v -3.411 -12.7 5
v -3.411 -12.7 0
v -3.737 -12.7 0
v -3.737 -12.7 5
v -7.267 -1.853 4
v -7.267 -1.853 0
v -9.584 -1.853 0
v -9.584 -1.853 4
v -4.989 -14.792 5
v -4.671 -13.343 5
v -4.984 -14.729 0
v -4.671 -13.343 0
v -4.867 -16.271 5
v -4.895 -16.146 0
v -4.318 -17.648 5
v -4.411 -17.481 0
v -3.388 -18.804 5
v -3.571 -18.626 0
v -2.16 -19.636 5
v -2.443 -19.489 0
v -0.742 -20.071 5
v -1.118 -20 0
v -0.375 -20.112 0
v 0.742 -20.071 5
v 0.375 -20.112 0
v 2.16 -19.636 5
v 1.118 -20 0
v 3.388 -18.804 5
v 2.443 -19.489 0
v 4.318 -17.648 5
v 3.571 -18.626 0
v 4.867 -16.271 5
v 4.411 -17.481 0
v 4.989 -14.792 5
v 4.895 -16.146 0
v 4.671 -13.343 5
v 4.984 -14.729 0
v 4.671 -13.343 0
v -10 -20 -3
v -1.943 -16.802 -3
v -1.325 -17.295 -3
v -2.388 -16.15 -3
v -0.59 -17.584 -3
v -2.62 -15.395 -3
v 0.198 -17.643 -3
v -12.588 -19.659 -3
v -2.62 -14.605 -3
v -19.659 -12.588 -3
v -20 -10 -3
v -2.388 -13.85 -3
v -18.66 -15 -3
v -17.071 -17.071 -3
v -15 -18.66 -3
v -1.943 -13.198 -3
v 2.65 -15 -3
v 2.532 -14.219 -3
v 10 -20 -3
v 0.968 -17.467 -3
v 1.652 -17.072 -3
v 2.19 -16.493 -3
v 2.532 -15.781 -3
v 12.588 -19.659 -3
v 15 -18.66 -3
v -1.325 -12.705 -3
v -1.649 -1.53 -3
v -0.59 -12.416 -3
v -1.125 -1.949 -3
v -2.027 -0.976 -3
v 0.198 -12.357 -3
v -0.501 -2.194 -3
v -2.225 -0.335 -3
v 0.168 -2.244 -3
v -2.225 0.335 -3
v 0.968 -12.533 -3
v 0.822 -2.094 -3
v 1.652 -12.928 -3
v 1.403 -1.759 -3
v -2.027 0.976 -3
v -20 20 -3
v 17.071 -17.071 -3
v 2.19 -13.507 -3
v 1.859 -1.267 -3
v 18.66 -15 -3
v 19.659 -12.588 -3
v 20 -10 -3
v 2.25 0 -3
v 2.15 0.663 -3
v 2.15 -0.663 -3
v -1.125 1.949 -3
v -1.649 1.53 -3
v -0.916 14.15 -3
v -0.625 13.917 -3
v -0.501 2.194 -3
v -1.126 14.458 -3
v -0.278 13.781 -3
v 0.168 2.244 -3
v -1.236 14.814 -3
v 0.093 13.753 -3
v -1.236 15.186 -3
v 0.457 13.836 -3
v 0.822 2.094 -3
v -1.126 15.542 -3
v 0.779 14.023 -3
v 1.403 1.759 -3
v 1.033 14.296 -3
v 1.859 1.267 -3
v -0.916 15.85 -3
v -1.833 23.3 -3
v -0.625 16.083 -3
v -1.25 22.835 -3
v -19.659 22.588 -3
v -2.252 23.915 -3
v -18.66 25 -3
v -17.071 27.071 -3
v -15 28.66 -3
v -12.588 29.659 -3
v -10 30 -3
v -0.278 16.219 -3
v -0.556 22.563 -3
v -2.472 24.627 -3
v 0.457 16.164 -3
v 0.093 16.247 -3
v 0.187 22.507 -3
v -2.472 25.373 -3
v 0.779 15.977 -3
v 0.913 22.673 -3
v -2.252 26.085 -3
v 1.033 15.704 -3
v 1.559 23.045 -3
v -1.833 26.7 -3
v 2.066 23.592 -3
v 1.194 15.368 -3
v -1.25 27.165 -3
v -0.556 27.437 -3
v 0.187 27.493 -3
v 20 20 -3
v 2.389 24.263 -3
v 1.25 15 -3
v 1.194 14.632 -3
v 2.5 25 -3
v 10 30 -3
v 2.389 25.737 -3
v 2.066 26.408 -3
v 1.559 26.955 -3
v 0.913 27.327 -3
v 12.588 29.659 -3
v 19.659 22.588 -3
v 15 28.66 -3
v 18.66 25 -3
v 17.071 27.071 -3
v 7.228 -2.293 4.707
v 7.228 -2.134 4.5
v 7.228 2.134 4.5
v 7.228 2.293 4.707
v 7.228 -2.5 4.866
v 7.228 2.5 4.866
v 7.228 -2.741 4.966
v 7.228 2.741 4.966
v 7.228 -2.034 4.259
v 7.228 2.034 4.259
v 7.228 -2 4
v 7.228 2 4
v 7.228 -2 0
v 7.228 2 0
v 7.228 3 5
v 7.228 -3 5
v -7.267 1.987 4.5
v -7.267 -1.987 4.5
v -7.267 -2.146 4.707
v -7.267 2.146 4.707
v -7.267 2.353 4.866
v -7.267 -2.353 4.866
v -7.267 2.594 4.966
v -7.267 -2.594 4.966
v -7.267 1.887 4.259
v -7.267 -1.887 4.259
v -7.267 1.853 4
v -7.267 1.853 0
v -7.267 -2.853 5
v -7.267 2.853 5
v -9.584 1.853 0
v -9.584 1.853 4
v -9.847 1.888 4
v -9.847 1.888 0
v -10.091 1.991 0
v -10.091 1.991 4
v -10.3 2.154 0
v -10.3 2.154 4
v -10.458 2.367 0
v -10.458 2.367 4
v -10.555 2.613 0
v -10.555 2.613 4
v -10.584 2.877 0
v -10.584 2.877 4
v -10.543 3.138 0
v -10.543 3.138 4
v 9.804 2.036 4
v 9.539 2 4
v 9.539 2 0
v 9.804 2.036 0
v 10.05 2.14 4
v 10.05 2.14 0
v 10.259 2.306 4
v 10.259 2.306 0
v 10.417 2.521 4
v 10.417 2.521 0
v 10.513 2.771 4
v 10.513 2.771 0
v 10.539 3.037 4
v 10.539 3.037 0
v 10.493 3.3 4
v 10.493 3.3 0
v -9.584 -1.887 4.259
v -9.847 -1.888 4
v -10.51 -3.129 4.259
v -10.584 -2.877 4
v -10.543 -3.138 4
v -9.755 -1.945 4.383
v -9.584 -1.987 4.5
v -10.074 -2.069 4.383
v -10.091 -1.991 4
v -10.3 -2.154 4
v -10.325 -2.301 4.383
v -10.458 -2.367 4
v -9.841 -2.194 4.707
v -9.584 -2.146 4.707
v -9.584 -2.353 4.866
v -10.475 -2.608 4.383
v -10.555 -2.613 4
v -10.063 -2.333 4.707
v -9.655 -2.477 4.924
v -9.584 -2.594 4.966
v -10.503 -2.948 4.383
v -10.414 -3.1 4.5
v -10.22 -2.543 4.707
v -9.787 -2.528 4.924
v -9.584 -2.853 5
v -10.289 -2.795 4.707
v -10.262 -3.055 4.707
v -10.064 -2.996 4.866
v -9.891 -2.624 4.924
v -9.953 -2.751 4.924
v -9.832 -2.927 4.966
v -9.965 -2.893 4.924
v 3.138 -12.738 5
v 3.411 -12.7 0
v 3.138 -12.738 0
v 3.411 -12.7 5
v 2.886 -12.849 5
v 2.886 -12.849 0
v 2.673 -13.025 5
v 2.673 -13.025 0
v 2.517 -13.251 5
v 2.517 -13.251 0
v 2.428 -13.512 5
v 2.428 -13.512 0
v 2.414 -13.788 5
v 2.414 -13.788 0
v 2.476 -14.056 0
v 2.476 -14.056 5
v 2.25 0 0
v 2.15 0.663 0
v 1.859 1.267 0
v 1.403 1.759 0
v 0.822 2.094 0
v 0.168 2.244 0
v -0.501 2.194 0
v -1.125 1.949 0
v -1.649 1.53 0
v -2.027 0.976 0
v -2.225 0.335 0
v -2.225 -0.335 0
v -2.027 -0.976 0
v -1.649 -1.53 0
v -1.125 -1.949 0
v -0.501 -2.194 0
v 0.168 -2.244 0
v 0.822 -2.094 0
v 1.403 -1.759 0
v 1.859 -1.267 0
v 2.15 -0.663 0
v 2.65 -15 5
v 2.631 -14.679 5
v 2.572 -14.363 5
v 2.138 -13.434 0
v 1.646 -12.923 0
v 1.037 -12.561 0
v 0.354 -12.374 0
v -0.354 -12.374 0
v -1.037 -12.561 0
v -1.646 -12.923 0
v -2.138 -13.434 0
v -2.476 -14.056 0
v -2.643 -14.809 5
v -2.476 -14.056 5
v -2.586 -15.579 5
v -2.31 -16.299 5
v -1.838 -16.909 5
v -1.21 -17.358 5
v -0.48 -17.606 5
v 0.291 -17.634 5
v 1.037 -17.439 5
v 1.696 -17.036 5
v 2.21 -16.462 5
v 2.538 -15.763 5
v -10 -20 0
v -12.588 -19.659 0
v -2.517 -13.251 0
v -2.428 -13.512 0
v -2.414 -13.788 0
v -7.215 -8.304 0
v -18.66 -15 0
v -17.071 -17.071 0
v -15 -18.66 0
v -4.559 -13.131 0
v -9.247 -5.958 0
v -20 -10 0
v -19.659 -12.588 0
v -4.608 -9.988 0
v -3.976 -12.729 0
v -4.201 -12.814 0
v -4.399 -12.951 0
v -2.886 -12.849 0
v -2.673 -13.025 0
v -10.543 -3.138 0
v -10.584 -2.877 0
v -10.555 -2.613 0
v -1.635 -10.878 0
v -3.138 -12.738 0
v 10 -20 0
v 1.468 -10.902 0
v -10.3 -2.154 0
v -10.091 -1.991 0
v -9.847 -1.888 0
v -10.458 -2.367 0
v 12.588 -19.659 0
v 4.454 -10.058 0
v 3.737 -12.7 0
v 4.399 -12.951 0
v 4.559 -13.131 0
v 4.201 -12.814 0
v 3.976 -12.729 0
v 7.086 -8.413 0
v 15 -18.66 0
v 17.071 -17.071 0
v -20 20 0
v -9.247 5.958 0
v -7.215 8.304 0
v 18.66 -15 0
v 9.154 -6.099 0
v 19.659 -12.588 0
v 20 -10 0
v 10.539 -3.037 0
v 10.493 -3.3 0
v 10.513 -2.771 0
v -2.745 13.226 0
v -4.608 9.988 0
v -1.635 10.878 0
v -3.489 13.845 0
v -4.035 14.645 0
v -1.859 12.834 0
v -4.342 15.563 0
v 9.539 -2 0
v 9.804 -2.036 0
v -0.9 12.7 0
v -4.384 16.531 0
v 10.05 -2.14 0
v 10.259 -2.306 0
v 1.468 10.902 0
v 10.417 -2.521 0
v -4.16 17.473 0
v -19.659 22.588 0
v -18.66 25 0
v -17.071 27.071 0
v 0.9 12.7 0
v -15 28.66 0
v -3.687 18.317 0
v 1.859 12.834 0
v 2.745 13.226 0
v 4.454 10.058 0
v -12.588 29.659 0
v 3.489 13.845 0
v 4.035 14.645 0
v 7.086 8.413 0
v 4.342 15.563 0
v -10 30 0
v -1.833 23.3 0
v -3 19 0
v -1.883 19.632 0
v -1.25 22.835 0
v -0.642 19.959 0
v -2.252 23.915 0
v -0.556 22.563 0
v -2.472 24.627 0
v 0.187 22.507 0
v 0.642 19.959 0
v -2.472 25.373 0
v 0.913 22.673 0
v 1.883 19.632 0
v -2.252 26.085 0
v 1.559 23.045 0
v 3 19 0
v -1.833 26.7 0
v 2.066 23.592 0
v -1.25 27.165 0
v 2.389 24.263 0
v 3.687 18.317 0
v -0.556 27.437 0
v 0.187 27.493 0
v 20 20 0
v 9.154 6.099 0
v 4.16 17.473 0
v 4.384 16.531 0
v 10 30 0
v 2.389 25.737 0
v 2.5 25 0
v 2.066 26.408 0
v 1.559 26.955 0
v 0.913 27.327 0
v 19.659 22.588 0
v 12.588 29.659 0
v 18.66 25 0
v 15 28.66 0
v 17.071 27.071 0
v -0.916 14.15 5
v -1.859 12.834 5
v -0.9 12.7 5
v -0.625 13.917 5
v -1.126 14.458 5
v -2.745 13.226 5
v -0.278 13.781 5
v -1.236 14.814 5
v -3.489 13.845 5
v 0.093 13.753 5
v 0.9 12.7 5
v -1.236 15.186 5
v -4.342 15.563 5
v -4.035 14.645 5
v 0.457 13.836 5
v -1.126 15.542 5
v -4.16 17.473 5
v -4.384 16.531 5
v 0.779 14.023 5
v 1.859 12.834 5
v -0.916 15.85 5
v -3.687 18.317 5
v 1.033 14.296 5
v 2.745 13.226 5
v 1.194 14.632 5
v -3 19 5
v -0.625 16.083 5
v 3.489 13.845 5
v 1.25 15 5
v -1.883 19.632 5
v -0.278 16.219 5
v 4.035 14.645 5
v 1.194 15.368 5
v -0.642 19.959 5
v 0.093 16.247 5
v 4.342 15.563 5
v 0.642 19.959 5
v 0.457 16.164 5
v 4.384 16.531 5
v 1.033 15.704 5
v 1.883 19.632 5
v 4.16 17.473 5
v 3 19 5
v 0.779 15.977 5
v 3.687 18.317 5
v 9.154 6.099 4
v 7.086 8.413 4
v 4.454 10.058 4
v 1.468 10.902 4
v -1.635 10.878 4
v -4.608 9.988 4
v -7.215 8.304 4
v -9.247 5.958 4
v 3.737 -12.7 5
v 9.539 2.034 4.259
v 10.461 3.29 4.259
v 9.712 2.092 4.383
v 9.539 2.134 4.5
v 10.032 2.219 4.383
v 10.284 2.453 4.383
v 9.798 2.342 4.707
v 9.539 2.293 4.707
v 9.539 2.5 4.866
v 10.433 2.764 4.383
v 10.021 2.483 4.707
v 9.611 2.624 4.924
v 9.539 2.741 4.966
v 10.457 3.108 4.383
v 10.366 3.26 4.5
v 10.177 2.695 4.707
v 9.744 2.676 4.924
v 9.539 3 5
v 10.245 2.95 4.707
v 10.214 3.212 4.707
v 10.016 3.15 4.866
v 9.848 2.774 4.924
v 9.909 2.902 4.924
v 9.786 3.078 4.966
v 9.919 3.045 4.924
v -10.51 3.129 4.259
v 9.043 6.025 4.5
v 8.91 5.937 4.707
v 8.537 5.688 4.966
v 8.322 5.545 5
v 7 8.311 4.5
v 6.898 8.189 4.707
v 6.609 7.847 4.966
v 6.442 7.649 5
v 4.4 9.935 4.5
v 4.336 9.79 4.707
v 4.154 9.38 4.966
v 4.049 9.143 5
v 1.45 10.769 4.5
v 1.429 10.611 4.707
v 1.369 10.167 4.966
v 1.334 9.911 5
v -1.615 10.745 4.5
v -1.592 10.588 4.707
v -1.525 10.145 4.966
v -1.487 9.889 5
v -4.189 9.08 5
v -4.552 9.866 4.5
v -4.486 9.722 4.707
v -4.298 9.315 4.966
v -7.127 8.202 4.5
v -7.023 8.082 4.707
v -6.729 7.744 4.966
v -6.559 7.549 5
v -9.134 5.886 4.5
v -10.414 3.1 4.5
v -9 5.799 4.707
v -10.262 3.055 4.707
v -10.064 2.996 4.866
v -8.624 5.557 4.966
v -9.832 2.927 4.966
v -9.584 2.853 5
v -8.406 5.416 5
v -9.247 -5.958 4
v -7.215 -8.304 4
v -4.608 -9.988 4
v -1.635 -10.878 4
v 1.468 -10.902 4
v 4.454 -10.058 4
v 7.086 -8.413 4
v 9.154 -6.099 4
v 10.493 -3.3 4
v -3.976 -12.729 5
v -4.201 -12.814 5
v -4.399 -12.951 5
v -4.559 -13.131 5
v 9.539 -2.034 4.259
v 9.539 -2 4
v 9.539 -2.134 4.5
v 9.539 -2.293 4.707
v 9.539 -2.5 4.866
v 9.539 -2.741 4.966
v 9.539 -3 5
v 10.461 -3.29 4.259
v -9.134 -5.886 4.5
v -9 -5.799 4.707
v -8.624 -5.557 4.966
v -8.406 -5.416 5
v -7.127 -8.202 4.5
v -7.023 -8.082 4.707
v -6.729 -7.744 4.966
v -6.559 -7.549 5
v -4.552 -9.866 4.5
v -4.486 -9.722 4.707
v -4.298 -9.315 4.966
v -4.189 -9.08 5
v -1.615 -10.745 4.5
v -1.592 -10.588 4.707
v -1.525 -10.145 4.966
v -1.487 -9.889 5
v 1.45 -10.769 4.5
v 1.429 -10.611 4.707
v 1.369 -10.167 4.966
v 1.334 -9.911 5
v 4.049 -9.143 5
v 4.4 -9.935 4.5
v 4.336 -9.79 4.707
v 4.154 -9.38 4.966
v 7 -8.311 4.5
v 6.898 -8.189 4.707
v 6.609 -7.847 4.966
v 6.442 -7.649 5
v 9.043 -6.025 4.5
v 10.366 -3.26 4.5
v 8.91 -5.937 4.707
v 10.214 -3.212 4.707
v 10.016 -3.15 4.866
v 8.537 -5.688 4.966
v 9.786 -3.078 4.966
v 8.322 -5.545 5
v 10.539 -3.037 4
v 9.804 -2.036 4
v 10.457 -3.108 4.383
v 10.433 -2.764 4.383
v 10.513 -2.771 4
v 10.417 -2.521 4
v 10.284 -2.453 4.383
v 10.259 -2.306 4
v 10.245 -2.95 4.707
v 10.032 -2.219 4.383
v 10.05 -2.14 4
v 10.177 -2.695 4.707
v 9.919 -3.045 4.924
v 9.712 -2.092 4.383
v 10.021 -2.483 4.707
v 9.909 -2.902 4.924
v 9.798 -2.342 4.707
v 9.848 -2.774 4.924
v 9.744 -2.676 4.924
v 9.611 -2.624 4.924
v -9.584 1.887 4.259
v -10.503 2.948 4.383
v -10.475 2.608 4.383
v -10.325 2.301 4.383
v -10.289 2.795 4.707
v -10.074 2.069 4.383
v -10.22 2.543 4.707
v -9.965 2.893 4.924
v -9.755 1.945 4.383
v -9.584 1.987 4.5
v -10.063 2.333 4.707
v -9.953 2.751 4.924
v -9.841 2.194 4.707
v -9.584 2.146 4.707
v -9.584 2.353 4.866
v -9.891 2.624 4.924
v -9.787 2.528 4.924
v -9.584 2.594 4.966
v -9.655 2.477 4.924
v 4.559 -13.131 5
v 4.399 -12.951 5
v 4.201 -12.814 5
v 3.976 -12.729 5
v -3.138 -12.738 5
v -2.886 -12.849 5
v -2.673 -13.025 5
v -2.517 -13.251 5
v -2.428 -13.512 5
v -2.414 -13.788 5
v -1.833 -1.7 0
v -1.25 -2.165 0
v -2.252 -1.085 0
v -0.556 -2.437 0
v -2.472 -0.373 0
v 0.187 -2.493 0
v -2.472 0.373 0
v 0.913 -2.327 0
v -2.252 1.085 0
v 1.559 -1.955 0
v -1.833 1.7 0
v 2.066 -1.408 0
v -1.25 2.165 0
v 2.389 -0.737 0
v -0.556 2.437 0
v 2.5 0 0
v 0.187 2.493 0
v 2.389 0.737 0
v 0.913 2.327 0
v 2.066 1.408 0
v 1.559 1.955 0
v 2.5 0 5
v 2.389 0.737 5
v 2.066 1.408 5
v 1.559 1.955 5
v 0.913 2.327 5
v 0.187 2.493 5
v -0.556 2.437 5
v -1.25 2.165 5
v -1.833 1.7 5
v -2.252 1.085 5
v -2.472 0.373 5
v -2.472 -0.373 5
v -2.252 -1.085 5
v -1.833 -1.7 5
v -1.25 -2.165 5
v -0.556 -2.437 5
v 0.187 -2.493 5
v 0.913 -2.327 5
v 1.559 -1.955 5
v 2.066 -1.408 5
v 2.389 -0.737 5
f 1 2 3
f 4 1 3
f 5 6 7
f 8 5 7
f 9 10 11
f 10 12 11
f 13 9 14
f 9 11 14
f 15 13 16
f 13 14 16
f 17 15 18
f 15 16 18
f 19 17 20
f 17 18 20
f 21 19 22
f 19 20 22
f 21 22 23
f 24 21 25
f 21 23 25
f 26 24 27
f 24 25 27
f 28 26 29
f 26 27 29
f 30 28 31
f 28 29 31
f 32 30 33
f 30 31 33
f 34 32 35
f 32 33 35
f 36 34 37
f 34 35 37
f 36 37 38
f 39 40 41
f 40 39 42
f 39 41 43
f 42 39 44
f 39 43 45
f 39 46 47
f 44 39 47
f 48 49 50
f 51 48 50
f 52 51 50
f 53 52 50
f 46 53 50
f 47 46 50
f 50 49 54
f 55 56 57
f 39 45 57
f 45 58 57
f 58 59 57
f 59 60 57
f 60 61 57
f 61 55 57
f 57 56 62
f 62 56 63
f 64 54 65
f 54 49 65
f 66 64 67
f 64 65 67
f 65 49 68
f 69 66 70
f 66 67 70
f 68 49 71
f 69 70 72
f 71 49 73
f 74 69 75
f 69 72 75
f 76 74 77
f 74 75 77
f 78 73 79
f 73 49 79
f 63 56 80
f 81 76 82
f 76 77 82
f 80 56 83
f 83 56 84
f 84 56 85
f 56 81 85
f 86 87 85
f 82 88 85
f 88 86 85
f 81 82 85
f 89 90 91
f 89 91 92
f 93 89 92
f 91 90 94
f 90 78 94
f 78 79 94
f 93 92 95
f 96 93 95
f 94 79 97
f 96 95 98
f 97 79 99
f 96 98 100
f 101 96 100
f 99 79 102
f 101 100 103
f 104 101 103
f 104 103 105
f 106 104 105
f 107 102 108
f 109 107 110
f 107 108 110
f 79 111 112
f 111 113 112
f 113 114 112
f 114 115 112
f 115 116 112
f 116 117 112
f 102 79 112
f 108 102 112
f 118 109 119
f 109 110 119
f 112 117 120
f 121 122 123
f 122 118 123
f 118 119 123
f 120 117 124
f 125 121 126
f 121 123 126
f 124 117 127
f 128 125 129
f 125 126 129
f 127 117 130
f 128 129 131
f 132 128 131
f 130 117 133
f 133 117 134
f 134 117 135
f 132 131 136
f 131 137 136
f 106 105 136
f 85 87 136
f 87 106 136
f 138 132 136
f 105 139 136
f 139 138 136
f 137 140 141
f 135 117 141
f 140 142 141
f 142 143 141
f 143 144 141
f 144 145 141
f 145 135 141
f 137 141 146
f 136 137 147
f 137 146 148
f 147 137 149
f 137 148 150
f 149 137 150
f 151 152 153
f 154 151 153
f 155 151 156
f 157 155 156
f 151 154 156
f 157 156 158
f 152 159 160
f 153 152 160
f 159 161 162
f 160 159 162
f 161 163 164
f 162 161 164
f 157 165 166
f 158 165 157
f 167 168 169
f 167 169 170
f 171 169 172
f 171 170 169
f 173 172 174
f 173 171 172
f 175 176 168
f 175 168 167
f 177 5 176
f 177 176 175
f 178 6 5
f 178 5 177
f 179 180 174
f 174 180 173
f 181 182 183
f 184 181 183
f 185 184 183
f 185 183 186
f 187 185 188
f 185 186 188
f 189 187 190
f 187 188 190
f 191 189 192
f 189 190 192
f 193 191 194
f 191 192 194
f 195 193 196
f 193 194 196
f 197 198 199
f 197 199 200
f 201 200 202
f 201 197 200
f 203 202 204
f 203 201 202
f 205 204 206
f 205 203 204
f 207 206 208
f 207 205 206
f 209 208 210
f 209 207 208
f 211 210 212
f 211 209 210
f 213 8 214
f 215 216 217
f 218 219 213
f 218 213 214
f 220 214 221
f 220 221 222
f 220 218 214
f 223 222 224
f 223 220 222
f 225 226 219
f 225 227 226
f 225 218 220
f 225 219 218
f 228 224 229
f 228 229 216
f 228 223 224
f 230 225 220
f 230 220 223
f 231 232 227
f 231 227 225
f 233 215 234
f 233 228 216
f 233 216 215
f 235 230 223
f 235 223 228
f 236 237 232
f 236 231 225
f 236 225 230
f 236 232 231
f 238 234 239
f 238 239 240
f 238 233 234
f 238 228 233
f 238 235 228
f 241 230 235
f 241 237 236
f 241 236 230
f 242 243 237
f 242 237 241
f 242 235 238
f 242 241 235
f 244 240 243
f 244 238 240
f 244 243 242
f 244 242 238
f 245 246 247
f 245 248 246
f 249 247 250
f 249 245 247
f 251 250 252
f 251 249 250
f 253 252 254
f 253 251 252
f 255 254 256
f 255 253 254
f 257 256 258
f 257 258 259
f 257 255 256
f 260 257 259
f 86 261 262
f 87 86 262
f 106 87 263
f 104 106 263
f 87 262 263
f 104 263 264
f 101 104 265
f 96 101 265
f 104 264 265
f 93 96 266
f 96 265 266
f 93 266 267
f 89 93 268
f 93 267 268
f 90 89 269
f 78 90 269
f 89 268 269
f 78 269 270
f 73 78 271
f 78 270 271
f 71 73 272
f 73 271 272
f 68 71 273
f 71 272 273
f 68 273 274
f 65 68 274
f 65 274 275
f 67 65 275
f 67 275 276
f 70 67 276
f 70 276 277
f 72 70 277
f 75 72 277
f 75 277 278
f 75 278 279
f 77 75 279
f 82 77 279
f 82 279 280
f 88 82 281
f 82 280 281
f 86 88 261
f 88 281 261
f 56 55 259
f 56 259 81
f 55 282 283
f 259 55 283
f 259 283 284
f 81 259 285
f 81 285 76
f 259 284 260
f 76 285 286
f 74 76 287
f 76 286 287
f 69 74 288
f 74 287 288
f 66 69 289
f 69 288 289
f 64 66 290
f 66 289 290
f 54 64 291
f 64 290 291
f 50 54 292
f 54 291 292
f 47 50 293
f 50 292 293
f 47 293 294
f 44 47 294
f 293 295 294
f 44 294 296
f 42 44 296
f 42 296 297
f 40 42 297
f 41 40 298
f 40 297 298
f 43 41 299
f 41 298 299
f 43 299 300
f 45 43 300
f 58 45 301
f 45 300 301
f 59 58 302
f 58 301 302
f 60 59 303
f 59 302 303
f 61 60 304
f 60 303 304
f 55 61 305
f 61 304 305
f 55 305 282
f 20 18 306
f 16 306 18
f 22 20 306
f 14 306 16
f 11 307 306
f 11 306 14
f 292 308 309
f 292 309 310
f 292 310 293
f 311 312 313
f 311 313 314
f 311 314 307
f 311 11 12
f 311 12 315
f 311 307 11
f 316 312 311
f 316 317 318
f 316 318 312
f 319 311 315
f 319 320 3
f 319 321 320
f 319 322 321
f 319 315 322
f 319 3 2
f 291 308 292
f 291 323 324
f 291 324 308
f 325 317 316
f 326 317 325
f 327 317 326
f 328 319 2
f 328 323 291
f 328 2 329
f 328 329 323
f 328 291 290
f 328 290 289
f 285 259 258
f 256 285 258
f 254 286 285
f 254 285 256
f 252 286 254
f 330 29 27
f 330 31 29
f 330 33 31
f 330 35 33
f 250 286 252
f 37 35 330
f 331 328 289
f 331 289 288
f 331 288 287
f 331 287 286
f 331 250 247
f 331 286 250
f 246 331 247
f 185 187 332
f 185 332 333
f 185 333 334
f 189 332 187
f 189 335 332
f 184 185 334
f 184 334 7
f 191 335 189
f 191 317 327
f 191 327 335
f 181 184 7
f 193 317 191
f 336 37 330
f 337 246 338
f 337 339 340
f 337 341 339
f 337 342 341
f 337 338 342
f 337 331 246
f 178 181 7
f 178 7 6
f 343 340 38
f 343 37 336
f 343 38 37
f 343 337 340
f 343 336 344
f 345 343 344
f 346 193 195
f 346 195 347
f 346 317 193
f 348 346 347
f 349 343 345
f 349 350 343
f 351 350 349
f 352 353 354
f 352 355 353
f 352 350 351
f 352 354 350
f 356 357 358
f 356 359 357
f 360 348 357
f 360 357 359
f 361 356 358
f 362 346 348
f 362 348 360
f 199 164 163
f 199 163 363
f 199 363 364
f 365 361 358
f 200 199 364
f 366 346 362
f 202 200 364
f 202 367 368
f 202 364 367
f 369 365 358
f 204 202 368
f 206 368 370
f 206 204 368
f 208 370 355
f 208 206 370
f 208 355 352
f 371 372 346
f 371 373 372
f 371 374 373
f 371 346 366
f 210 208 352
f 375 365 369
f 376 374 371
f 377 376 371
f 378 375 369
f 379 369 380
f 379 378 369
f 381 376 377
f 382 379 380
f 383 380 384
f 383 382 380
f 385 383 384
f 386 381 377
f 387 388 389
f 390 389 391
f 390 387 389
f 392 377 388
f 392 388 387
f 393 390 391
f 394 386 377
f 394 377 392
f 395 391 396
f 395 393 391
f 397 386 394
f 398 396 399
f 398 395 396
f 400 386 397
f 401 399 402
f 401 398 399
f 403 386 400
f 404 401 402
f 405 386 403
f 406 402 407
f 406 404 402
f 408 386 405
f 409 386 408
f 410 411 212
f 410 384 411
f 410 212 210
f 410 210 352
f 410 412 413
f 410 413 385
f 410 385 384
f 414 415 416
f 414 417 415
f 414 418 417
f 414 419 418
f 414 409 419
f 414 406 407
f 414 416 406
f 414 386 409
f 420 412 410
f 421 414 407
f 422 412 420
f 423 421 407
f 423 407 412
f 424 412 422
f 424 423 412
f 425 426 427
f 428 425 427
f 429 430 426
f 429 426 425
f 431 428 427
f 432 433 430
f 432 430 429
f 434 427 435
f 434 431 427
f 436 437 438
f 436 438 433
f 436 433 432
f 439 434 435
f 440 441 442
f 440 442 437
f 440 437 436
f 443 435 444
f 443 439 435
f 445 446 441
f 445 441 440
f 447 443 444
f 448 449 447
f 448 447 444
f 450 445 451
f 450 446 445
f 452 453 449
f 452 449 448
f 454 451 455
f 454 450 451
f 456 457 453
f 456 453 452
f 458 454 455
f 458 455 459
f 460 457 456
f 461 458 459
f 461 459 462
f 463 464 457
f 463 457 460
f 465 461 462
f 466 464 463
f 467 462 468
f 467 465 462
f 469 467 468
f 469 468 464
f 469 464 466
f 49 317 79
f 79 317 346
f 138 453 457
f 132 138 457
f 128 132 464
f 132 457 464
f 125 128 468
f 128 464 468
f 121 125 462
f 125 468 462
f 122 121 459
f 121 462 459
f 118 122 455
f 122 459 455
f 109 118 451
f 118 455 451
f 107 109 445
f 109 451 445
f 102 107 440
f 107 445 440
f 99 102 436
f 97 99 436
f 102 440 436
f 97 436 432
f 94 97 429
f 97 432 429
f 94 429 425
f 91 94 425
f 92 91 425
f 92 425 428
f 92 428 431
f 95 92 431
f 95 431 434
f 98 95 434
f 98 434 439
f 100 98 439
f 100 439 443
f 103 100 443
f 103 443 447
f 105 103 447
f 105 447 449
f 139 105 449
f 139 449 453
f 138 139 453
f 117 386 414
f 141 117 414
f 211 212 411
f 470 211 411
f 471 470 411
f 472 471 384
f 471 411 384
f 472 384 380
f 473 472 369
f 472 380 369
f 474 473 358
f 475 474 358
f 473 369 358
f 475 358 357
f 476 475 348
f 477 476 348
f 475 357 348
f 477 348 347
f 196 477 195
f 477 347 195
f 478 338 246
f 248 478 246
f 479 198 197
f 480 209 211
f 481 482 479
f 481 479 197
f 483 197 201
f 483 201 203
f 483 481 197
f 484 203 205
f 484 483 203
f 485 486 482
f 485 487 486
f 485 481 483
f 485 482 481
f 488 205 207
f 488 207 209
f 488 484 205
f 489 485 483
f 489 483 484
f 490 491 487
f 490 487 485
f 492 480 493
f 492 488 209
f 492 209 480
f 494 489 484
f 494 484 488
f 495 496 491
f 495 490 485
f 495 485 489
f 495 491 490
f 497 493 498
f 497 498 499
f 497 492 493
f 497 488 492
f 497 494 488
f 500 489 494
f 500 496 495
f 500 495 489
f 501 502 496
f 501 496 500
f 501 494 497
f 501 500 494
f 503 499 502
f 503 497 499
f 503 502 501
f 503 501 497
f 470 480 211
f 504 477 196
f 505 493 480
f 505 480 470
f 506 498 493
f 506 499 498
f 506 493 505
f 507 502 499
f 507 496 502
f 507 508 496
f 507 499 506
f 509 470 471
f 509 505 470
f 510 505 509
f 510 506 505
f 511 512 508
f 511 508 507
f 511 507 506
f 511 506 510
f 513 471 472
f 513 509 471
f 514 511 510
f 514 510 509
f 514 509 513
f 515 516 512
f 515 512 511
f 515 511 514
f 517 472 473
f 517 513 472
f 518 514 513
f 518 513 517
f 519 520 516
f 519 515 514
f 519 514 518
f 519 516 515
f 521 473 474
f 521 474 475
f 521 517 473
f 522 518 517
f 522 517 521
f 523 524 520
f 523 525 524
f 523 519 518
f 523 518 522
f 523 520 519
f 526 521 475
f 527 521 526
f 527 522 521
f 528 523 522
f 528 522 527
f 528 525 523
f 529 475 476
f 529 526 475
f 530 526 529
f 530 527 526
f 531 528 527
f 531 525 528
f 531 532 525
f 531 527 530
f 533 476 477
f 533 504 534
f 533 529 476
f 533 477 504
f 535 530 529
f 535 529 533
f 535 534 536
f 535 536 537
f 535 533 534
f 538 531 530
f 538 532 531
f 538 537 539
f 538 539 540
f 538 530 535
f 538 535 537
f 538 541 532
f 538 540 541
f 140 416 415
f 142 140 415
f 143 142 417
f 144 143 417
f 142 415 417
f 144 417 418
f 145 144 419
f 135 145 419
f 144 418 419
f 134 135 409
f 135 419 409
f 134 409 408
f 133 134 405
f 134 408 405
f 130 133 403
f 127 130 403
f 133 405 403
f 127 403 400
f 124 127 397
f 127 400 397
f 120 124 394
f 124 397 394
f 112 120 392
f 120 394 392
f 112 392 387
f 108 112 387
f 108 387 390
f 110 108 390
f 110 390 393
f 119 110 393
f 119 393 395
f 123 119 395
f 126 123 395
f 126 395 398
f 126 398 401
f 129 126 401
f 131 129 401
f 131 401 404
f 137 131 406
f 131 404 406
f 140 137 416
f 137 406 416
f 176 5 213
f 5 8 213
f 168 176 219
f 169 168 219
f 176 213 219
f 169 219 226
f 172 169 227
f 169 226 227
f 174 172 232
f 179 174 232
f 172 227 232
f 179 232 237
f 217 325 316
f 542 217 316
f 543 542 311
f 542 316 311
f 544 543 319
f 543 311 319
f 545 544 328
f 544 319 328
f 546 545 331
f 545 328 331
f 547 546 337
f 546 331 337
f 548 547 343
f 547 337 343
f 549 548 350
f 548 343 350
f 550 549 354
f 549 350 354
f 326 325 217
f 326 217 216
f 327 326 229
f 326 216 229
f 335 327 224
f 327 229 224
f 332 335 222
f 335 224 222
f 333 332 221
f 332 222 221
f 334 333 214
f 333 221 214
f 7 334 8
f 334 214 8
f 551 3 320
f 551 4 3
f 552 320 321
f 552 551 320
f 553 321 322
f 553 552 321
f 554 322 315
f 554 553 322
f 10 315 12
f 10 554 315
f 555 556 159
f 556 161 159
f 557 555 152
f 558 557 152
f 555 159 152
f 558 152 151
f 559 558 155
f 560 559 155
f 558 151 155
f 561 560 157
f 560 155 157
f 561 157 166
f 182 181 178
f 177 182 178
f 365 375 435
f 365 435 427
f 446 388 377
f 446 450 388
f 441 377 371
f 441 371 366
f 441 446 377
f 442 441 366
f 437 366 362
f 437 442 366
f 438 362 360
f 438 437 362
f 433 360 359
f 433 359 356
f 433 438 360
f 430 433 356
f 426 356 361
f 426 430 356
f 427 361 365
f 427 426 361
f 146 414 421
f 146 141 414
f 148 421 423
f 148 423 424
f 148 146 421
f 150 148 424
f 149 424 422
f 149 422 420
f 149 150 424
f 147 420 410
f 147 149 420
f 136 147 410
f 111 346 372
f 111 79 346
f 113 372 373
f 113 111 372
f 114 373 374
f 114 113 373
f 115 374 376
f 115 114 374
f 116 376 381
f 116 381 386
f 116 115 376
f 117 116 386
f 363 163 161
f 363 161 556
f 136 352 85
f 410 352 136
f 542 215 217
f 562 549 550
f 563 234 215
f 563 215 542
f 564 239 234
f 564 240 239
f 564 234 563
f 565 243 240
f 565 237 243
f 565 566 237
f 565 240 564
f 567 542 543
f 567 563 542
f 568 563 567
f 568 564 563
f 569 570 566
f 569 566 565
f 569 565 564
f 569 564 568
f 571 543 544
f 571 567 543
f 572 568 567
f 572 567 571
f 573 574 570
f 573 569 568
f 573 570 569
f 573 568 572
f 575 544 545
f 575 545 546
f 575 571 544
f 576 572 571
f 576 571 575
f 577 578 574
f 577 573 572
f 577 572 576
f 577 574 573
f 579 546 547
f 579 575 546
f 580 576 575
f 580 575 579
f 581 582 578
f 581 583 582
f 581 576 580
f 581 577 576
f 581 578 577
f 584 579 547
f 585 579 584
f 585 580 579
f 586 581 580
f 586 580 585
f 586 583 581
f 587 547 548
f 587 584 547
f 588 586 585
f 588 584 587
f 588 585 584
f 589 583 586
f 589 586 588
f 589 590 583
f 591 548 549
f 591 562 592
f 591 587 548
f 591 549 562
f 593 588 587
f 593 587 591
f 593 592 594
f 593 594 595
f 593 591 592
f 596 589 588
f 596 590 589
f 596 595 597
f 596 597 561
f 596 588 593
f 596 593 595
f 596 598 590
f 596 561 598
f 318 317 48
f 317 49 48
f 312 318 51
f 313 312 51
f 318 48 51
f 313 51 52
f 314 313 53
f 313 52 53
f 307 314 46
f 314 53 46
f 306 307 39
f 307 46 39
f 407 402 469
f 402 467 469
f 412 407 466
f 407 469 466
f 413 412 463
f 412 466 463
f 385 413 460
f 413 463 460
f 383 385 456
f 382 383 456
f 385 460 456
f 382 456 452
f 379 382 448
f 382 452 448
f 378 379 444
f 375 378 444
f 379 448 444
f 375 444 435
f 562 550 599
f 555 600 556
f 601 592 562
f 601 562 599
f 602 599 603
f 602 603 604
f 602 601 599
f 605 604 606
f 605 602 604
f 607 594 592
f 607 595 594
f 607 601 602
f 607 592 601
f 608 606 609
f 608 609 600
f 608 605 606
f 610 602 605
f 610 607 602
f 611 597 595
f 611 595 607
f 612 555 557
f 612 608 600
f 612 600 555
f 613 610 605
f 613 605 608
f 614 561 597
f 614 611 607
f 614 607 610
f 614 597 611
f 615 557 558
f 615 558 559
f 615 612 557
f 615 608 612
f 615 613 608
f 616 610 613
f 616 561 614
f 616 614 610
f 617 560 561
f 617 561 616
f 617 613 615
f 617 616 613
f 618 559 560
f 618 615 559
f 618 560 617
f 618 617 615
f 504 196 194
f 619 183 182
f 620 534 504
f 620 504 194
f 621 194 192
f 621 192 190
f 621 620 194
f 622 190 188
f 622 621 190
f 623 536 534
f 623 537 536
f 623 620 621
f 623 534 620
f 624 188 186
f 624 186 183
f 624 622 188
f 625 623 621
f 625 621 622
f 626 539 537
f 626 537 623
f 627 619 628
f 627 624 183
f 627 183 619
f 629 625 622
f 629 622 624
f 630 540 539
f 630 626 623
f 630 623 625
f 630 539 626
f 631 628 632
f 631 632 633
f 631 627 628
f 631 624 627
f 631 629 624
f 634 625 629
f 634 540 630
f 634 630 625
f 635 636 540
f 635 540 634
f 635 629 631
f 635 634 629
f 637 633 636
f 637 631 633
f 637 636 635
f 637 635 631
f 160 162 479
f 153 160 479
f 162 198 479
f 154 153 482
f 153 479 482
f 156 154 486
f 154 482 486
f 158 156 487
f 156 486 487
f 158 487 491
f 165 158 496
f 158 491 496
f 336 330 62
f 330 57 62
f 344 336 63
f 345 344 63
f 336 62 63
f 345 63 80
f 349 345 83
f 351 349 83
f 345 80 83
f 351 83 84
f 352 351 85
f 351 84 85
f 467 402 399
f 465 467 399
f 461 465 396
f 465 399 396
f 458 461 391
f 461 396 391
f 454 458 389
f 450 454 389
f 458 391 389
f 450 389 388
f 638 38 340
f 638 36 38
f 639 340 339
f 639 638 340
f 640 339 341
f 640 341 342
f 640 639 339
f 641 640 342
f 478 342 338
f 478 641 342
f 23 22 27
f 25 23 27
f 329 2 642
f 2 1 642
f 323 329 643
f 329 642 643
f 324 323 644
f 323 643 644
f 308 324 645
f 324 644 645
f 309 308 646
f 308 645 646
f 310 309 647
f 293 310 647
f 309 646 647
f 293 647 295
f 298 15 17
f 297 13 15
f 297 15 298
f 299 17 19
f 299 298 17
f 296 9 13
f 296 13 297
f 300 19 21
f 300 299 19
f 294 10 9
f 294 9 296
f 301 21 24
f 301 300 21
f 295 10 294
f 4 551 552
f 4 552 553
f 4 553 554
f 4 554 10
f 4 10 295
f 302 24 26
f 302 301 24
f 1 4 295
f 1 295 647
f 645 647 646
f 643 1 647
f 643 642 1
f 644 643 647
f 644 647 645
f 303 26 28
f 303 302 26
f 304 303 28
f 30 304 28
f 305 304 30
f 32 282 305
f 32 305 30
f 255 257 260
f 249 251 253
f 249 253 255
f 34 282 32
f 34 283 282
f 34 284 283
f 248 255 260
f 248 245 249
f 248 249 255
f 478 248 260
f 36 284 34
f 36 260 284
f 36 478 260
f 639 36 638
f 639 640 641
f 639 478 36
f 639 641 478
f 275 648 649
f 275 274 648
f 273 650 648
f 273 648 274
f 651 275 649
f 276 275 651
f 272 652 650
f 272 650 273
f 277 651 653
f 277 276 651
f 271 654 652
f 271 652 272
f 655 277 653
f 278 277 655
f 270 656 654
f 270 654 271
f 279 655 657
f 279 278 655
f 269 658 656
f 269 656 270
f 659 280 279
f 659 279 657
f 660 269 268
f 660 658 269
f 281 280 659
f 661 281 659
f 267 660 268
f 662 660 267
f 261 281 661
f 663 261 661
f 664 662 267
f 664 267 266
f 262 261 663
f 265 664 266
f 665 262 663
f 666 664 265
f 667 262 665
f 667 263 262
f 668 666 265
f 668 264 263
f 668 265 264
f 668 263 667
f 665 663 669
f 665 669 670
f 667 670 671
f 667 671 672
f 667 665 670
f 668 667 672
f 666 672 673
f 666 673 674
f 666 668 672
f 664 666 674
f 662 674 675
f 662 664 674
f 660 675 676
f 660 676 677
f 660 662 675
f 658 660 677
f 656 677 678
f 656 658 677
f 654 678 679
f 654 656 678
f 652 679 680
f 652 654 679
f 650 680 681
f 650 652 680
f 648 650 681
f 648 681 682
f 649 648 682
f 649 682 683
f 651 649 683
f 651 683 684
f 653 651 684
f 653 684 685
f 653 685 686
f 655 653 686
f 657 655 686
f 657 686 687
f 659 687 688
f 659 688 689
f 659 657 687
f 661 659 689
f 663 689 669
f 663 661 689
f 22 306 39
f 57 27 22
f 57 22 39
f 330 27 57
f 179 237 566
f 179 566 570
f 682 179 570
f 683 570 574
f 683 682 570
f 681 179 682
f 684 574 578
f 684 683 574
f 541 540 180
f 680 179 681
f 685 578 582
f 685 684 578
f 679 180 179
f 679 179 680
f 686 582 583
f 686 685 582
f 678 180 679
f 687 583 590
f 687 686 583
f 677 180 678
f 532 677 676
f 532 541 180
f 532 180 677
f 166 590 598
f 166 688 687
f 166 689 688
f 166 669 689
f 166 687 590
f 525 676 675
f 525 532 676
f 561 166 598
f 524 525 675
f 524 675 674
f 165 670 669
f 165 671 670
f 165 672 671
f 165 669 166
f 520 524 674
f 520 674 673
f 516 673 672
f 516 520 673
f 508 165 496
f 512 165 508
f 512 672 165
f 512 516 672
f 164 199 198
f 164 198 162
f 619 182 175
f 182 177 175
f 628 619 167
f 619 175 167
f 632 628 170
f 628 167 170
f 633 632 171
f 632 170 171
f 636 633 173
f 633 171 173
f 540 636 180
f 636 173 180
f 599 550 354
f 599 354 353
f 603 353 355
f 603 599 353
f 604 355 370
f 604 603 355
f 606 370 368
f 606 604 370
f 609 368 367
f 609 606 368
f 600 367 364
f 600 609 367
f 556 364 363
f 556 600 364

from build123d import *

# Parameters (mm, degrees)
SKETCH_R      = 2.5
PAD_DEPTH     = 5
SKETCH001_W   = 40
SKETCH001_H   = 50
SKETCH001_R   = 2.25
SKETCH001_R_2 = 2.5
PAD001_DEPTH  = 3
FILLET_R      = 10
PAD002_DEPTH  = 5
SKETCH003_R   = 1.25
SKETCH003_R_2 = 2.65
POCKET_DEPTH  = 8.001
FILLET001_R   = 1
FILLET002_R   = 1
FILLET003_R   = 1
FILLET004_R   = 3.5
FILLET005_R   = 1
FILLET006_R   = 1
FILLET007_R   = 1
FILLET008_R   = 1


with BuildPart() as part:
    # Sketch → Pad (new body)
    with BuildSketch(Plane.XY):
        with BuildLine():
            ThreePointArc((-10.842791, -1.853074), (-0.074616, -10.999747), (10.816654, -2))
            Line((7.228416, -2), (10.816654, -2))
            Line((7.228416, -2), (7.228416, 2))
            Line((10.816654, 2), (7.228416, 2))
            ThreePointArc((10.816654, 2), (-0.074616, 10.999747), (-10.842791, 1.853074))
            Line((-10.842791, 1.853074), (-7.26747, 1.853074))
            Line((-7.26747, -1.853074), (-7.26747, 1.853074))
            Line((-7.26747, -1.853074), (-10.842791, -1.853074))
        make_face()
        Circle(SKETCH_R, mode=Mode.SUBTRACT)
    extrude(amount=PAD_DEPTH)

    # Sketch001 → Pad001 (join)
    with BuildSketch(Plane.XY):
        with Locations((0, 5)):
            Rectangle(SKETCH001_W, SKETCH001_H)
        Circle(SKETCH001_R, mode=Mode.SUBTRACT)
        with Locations((0, 25)):
            Circle(SKETCH001_R_2, mode=Mode.SUBTRACT)
        with Locations((0, -15)):
            Circle(SKETCH001_R_2, mode=Mode.SUBTRACT)
    extrude(amount=-PAD001_DEPTH)

    # Fillet
    fillet_edges = [part.edges().sort_by_distance(p)[0] for p in [
        (20, -20, -1.5),
        (-20, -20, -1.5),
        (-20, 30, -1.5),
        (20, 30, -1.5),
    ]]
    fillet(fillet_edges, radius=FILLET_R)

    # Sketch002 (on Face2 of Fillet) → Pad002 (join)
    with BuildSketch(Plane.XY):
        with BuildLine():
            ThreePointArc((-4.371719, -12.7), (0, -20.126535), (4.371719, -12.7))
            Line((4.371719, -12.7), (-4.371719, -12.7))
        make_face()
        with BuildLine():
            ThreePointArc((4.439595, 12.7), (0, 20), (-4.439595, 12.7))
            Line((4.439595, 12.7), (-4.439595, 12.7))
        make_face()
    extrude(amount=PAD002_DEPTH)

    # Sketch003 (on Face30 of Pad002) → Pocket (cut, through all)
    with BuildSketch(Plane.XY.offset(5)):
        with Locations((0, 15)):
            Circle(SKETCH003_R)
        with Locations((0, -15)):
            Circle(SKETCH003_R_2)
    extrude(amount=-POCKET_DEPTH, mode=Mode.SUBTRACT)

    # Fillet001
    fillet001_edges = [part.edges().sort_by_distance(p)[0] for p in [
        (1.316245, -12.7, 2.5),
        (-1.316245, -12.7, 2.5),
    ]]
    fillet(fillet001_edges, radius=FILLET001_R)

    # Fillet002
    fillet002_edges = [part.edges().sort_by_distance(p)[0] for p in [
        (-4.371719, -12.7, 2.5),
    ]]
    fillet(fillet002_edges, radius=FILLET002_R)

    # Fillet003
    fillet003_edges = [part.edges().sort_by_distance(p)[0] for p in [
        (4.371719, -12.7, 2.5),
    ]]
    fillet(fillet003_edges, radius=FILLET003_R)

    # Fillet004
    fillet004_edges = [part.edges().sort_by_distance(p)[0] for p in [
        (-4.439595, 12.7, 2.5),
        (4.439595, 12.7, 2.5),
    ]]
    fillet(fillet004_edges, radius=FILLET004_R)

    # Fillet005
    fillet005_edges = [part.edges().sort_by_distance(p)[0] for p in [
        (-10.842791, 1.853074, 2.5),
        (-10.842791, -1.853074, 2.5),
    ]]
    fillet(fillet005_edges, radius=FILLET005_R)

    # Fillet006
    fillet006_edges = [part.edges().sort_by_distance(p)[0] for p in [
        (10.816654, 2, 2.5),
        (10.816654, -2, 2.5),
    ]]
    fillet(fillet006_edges, radius=FILLET006_R)

    # Fillet007
    fillet007_edges = [part.edges().sort_by_distance(p)[0] for p in [
        (-0.084509, -10.999675, 5),
    ]]
    fillet(fillet007_edges, radius=FILLET007_R)

    # Fillet008
    fillet008_edges = [part.edges().sort_by_distance(p)[0] for p in [
        (-0.084509, 10.999675, 5),
    ]]
    fillet(fillet008_edges, radius=FILLET008_R)


solid = part.part
